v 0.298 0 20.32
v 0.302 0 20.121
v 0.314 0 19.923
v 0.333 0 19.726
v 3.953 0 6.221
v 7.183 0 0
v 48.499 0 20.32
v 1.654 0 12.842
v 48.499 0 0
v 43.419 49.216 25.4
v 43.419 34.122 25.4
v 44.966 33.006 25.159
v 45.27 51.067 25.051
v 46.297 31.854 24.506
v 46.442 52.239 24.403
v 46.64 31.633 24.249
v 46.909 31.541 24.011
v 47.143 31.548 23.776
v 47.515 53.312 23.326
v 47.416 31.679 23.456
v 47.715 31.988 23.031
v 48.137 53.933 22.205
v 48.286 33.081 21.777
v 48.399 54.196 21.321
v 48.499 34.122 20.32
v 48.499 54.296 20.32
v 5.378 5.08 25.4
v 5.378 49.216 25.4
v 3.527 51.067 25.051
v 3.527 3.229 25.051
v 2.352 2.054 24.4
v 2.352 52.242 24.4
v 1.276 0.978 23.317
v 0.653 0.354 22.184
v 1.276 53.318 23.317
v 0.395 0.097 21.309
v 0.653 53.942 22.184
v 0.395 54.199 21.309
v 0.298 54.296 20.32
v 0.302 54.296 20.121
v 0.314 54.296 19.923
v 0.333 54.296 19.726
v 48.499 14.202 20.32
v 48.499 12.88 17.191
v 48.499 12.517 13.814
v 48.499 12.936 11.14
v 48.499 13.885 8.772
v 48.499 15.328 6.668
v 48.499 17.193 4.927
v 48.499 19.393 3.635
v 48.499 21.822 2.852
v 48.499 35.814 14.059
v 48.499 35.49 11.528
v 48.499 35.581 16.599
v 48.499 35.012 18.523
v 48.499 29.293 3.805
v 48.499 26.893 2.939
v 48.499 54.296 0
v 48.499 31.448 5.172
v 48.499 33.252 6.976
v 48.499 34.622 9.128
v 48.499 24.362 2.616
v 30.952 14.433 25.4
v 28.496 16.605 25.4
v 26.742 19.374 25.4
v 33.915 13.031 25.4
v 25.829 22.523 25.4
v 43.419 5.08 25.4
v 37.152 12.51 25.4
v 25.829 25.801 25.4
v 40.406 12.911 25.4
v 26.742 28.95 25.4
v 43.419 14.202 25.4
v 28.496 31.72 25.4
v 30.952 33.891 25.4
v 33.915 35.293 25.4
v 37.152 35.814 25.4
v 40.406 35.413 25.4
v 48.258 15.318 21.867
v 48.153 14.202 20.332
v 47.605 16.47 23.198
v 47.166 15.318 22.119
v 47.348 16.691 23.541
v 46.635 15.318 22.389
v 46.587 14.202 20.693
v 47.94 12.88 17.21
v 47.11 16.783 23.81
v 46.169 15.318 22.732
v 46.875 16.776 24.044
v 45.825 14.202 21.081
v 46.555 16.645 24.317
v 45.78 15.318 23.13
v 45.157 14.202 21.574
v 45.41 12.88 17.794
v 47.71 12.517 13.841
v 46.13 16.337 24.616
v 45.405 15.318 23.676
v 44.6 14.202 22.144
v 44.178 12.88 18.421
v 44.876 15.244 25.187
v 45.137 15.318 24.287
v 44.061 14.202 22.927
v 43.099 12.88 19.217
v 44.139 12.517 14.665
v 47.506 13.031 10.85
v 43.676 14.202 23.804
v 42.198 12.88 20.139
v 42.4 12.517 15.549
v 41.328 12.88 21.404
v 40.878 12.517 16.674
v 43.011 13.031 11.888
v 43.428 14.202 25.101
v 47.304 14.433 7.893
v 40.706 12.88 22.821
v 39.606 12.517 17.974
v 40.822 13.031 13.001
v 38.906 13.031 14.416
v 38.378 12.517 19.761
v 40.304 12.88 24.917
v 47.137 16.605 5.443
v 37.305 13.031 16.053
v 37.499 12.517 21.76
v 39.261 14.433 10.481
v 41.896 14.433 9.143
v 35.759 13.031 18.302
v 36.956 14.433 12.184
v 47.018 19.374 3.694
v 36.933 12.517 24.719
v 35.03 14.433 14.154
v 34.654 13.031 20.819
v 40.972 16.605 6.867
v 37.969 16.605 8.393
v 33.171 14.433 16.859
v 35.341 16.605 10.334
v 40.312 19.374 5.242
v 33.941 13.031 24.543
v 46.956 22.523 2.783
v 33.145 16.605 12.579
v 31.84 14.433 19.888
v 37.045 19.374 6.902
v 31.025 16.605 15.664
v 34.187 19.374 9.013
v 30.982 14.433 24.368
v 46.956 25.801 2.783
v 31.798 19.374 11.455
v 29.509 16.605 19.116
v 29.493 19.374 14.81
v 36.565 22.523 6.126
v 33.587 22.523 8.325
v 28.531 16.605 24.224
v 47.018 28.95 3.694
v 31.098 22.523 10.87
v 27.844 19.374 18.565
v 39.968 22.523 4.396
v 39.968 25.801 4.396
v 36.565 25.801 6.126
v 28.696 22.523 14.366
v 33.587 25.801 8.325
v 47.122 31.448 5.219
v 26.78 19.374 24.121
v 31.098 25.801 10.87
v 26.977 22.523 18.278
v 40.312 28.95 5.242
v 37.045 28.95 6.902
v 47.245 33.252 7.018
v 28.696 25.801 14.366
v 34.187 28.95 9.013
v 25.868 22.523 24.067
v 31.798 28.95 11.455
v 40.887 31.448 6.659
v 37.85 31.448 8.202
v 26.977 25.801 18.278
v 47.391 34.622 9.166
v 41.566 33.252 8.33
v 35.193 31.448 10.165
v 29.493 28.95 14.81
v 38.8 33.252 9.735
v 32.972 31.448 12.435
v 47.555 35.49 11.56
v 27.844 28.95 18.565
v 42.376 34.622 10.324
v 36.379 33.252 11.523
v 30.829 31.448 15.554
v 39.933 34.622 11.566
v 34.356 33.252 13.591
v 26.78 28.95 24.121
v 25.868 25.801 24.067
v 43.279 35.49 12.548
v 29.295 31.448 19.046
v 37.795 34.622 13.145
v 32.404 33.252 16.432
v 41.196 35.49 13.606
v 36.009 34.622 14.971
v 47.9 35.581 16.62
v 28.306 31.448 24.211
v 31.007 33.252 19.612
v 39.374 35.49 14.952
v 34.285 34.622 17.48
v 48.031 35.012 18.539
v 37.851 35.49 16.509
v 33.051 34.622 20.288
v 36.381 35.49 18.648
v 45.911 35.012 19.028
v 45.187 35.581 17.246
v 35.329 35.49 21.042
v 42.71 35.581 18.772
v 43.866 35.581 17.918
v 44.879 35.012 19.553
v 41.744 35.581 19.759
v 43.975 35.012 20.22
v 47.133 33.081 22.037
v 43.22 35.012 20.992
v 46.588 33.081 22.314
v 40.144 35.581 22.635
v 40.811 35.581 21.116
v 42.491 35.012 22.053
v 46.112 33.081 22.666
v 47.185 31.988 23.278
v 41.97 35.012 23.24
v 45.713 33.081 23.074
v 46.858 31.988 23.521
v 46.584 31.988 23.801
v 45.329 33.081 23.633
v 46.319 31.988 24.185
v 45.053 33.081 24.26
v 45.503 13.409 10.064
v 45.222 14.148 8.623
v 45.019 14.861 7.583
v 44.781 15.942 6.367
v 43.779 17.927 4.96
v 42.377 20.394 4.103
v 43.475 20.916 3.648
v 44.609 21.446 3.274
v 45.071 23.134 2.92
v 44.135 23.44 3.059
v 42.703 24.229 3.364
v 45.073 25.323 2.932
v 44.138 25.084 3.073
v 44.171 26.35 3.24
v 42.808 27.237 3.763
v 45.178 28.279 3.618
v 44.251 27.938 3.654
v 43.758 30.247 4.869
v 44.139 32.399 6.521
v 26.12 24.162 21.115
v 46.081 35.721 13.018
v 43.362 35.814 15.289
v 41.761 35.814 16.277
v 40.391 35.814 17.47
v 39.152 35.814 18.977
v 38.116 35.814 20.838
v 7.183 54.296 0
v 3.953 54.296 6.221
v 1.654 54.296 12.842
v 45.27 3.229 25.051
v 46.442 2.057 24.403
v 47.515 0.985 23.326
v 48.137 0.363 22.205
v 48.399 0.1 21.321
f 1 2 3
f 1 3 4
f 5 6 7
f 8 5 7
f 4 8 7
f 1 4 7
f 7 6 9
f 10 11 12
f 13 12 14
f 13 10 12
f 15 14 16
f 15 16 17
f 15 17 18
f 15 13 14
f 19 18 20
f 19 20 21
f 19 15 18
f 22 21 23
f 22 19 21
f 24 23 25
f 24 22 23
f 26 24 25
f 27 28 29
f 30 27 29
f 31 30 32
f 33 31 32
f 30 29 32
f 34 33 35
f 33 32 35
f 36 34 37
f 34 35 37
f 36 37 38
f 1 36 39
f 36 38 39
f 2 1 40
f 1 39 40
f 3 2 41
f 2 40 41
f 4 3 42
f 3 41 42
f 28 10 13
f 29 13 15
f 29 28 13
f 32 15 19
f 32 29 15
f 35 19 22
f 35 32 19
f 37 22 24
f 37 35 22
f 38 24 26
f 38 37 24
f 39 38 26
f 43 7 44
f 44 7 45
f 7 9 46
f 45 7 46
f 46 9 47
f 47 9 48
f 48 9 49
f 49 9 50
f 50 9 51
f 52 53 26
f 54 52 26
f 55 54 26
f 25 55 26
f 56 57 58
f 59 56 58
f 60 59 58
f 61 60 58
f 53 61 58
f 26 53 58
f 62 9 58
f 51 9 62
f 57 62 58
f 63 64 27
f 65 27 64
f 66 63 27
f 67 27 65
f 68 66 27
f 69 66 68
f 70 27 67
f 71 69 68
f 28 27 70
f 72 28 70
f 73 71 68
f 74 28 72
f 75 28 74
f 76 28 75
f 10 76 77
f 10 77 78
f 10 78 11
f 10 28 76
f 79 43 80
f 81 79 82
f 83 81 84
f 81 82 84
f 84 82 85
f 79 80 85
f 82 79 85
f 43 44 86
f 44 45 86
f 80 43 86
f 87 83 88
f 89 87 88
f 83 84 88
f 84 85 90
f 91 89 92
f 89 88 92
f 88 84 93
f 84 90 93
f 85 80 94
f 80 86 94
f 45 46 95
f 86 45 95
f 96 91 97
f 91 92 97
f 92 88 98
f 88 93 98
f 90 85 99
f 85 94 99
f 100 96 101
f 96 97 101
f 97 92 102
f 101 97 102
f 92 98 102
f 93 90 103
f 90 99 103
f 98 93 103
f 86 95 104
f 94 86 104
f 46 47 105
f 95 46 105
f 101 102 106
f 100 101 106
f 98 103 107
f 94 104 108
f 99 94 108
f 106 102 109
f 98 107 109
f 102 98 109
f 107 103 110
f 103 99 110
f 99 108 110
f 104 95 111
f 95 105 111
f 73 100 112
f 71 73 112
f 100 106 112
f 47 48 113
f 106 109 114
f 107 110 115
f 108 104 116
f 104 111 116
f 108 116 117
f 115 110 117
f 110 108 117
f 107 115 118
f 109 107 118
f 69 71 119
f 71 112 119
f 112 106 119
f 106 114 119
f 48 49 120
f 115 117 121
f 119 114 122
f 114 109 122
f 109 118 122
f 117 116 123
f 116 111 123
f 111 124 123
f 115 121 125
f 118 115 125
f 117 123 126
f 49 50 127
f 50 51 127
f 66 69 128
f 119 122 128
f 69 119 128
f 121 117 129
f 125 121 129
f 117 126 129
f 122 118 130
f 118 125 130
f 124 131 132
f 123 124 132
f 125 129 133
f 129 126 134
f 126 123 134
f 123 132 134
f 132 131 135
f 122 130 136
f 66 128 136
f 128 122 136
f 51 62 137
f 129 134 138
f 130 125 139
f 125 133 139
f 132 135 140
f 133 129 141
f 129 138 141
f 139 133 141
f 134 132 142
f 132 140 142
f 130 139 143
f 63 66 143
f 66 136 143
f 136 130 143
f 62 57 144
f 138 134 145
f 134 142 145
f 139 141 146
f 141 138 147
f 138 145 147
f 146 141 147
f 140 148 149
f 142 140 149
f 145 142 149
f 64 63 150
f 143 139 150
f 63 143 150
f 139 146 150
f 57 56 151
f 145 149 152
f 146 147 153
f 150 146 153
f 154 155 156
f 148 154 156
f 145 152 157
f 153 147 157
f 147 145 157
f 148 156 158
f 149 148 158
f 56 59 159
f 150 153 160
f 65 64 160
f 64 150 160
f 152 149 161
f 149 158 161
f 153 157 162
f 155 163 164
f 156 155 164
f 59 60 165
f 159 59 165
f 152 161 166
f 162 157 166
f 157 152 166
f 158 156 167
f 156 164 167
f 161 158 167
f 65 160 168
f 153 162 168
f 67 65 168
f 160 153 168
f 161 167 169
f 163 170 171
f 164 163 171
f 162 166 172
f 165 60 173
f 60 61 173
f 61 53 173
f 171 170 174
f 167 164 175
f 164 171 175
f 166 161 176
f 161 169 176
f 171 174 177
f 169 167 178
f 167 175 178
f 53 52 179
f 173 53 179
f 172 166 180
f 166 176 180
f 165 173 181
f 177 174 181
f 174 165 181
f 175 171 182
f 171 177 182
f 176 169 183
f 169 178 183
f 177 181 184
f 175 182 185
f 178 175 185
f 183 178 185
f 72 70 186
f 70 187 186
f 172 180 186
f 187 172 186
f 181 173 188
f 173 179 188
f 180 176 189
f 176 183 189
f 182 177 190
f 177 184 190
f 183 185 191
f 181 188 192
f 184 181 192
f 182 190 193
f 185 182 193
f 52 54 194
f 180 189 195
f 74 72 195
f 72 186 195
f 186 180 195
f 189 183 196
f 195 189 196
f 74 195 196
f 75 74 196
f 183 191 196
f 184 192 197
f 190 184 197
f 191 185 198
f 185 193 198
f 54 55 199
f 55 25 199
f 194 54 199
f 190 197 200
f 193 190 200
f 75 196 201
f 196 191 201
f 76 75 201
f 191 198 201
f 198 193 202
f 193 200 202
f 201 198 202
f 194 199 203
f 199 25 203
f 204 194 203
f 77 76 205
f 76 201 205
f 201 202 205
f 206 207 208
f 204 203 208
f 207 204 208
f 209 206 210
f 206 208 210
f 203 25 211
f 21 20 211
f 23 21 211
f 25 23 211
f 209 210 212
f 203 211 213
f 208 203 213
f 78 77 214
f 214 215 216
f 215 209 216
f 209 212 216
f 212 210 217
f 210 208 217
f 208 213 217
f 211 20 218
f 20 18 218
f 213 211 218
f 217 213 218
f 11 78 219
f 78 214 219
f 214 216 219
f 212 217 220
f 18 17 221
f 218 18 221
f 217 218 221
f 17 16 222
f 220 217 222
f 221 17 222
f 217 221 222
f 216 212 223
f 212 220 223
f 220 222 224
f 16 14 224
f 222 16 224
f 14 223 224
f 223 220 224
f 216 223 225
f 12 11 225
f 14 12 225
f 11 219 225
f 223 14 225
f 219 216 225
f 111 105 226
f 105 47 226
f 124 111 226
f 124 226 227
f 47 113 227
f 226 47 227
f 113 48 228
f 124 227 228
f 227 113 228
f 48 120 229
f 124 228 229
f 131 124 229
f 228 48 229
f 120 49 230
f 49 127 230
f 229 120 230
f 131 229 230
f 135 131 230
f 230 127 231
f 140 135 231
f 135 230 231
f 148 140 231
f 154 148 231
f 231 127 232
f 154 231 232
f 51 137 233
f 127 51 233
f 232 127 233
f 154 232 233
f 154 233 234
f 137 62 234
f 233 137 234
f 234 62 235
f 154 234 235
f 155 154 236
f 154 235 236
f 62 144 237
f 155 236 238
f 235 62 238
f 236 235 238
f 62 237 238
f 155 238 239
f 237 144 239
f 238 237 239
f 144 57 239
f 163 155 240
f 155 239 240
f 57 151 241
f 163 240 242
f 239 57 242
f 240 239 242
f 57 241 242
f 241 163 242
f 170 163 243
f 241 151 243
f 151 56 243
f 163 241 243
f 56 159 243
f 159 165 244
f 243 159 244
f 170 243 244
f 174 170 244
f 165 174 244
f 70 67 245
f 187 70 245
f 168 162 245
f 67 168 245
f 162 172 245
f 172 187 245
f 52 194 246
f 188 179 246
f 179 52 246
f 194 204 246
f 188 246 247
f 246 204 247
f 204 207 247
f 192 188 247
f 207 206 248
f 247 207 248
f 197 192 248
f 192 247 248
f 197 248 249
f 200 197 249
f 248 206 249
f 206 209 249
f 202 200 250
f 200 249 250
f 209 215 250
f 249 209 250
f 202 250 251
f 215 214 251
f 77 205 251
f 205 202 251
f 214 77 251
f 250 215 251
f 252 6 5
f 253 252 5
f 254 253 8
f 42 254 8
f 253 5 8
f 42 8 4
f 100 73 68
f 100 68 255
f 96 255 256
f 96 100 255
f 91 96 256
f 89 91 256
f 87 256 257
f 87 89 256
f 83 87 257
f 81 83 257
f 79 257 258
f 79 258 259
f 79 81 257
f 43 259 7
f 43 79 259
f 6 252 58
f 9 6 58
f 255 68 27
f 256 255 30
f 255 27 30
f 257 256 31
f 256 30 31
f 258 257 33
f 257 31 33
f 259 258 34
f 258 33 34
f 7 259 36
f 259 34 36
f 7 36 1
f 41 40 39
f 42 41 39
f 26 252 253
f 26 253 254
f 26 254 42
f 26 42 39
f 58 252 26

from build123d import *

# Parameters (mm, degrees)
F0_W        = 48.4990663826
F0_H        = 54.2960166931
F1_DEPTH    = 25.4
F4_T1_DEPTH = 73.8990663826
F4_T3_DEPTH = 55.000743558
F4_T5_DEPTH = 60.9725440939
F4_T7_DEPTH = 82.7166388813


# Not quite as in the source:
# - a fillet or chamfer that OpenCascade refuses, or shapes differently, is made with other operations: its cross-section is extruded or revolved along the edge and cut away or added


with BuildPart() as f1:
    # F0 (on Top) → F1 (new body)
    with BuildSketch(Plane.XY):
        with Locations((24.2495331913, 27.1480083466)):
            Rectangle(F0_W, F0_H)
    extrude(amount=F1_DEPTH)

    # F2 (on face) → F3 (revolve, intersect)
    with BuildSketch(Plane.XY.offset(25.4)):
        with BuildLine():
            ThreePointArc((48.4990663826, 20.710743558), (25.7133262446, 24.1621080786), (48.4990663826, 27.6134725992))
            Line((48.4990663826, 27.6134725992), (48.4990663826, 54.2960166931))
            Line((48.4990663826, 54.2960166931), (0, 54.2960166931))
            Line((0, 54.2960166931), (0, 0))
            Line((0, 0), (48.4990663826, 0))
            Line((48.4990663826, 0), (48.4990663826, 20.710743558))
        make_face()
    revolve(axis=Axis((48.4990663826, 27.1480083466, 25.4), (0, 1, 0)), mode=Mode.INTERSECT)

    # F4: fillet of radius 5.08 on 5 edges, made by hand

    # F4_s2 → F4_t1 (cut)
    with BuildSketch(Plane.YZ.offset(-12.7)):
        with BuildLine():
            ThreePointArc((5.08, 25.4), (1.4878975516, 23.9121024484), (0, 20.32))
            Line((0, 20.32), (0, 25.4))
            Line((0, 25.4), (5.08, 25.4))
        make_face()
        with BuildLine():
            ThreePointArc((49.2160166931, 25.4), (52.8081191415, 23.9121024484), (54.2960166931, 20.32))
            Line((54.2960166931, 20.32), (54.2960166931, 25.4))
            Line((54.2960166931, 25.4), (49.2160166931, 25.4))
        make_face()
    extrude(amount=F4_T1_DEPTH, mode=Mode.SUBTRACT)

    # F4_s4 → F4_t3 (cut)
    with BuildSketch(Plane.XZ.offset(-42.300743558)):
        with BuildLine():
            ThreePointArc((43.4190663826, 25.4), (47.0111688311, 23.9121024484), (48.4990663826, 20.32))
            Line((48.4990663826, 20.32), (48.4990663826, 25.4))
            Line((48.4990663826, 25.4), (43.4190663826, 25.4))
        make_face()
    extrude(amount=F4_T3_DEPTH, mode=Mode.SUBTRACT)

    # F4_s6 → F4_t5 (cut)
    with BuildSketch(Plane.XZ.offset(-66.9960166931)):
        with BuildLine():
            ThreePointArc((43.4190663826, 25.4), (47.0111688311, 23.9121024484), (48.4990663826, 20.32))
            Line((48.4990663826, 20.32), (48.4990663826, 25.4))
            Line((48.4990663826, 25.4), (43.4190663826, 25.4))
        make_face()
    extrude(amount=F4_T5_DEPTH, mode=Mode.SUBTRACT)

    # F4_s8 → F4_t7 (cut)
    with BuildSketch(Plane.XZ.offset(-68.5063277872)):
        with BuildLine():
            ThreePointArc((5.3782022269, 25.4), (1.5817742667, 23.6954310455), (0.3330916761, 19.7256435997))
            ThreePointArc((0.3330916761, 19.7256435997), (0.0833445319, 22.5579377812), (0, 25.4))
            Line((0, 25.4), (5.3782022269, 25.4))
        make_face()
    extrude(amount=F4_T7_DEPTH, mode=Mode.SUBTRACT)


solid = f1.part
